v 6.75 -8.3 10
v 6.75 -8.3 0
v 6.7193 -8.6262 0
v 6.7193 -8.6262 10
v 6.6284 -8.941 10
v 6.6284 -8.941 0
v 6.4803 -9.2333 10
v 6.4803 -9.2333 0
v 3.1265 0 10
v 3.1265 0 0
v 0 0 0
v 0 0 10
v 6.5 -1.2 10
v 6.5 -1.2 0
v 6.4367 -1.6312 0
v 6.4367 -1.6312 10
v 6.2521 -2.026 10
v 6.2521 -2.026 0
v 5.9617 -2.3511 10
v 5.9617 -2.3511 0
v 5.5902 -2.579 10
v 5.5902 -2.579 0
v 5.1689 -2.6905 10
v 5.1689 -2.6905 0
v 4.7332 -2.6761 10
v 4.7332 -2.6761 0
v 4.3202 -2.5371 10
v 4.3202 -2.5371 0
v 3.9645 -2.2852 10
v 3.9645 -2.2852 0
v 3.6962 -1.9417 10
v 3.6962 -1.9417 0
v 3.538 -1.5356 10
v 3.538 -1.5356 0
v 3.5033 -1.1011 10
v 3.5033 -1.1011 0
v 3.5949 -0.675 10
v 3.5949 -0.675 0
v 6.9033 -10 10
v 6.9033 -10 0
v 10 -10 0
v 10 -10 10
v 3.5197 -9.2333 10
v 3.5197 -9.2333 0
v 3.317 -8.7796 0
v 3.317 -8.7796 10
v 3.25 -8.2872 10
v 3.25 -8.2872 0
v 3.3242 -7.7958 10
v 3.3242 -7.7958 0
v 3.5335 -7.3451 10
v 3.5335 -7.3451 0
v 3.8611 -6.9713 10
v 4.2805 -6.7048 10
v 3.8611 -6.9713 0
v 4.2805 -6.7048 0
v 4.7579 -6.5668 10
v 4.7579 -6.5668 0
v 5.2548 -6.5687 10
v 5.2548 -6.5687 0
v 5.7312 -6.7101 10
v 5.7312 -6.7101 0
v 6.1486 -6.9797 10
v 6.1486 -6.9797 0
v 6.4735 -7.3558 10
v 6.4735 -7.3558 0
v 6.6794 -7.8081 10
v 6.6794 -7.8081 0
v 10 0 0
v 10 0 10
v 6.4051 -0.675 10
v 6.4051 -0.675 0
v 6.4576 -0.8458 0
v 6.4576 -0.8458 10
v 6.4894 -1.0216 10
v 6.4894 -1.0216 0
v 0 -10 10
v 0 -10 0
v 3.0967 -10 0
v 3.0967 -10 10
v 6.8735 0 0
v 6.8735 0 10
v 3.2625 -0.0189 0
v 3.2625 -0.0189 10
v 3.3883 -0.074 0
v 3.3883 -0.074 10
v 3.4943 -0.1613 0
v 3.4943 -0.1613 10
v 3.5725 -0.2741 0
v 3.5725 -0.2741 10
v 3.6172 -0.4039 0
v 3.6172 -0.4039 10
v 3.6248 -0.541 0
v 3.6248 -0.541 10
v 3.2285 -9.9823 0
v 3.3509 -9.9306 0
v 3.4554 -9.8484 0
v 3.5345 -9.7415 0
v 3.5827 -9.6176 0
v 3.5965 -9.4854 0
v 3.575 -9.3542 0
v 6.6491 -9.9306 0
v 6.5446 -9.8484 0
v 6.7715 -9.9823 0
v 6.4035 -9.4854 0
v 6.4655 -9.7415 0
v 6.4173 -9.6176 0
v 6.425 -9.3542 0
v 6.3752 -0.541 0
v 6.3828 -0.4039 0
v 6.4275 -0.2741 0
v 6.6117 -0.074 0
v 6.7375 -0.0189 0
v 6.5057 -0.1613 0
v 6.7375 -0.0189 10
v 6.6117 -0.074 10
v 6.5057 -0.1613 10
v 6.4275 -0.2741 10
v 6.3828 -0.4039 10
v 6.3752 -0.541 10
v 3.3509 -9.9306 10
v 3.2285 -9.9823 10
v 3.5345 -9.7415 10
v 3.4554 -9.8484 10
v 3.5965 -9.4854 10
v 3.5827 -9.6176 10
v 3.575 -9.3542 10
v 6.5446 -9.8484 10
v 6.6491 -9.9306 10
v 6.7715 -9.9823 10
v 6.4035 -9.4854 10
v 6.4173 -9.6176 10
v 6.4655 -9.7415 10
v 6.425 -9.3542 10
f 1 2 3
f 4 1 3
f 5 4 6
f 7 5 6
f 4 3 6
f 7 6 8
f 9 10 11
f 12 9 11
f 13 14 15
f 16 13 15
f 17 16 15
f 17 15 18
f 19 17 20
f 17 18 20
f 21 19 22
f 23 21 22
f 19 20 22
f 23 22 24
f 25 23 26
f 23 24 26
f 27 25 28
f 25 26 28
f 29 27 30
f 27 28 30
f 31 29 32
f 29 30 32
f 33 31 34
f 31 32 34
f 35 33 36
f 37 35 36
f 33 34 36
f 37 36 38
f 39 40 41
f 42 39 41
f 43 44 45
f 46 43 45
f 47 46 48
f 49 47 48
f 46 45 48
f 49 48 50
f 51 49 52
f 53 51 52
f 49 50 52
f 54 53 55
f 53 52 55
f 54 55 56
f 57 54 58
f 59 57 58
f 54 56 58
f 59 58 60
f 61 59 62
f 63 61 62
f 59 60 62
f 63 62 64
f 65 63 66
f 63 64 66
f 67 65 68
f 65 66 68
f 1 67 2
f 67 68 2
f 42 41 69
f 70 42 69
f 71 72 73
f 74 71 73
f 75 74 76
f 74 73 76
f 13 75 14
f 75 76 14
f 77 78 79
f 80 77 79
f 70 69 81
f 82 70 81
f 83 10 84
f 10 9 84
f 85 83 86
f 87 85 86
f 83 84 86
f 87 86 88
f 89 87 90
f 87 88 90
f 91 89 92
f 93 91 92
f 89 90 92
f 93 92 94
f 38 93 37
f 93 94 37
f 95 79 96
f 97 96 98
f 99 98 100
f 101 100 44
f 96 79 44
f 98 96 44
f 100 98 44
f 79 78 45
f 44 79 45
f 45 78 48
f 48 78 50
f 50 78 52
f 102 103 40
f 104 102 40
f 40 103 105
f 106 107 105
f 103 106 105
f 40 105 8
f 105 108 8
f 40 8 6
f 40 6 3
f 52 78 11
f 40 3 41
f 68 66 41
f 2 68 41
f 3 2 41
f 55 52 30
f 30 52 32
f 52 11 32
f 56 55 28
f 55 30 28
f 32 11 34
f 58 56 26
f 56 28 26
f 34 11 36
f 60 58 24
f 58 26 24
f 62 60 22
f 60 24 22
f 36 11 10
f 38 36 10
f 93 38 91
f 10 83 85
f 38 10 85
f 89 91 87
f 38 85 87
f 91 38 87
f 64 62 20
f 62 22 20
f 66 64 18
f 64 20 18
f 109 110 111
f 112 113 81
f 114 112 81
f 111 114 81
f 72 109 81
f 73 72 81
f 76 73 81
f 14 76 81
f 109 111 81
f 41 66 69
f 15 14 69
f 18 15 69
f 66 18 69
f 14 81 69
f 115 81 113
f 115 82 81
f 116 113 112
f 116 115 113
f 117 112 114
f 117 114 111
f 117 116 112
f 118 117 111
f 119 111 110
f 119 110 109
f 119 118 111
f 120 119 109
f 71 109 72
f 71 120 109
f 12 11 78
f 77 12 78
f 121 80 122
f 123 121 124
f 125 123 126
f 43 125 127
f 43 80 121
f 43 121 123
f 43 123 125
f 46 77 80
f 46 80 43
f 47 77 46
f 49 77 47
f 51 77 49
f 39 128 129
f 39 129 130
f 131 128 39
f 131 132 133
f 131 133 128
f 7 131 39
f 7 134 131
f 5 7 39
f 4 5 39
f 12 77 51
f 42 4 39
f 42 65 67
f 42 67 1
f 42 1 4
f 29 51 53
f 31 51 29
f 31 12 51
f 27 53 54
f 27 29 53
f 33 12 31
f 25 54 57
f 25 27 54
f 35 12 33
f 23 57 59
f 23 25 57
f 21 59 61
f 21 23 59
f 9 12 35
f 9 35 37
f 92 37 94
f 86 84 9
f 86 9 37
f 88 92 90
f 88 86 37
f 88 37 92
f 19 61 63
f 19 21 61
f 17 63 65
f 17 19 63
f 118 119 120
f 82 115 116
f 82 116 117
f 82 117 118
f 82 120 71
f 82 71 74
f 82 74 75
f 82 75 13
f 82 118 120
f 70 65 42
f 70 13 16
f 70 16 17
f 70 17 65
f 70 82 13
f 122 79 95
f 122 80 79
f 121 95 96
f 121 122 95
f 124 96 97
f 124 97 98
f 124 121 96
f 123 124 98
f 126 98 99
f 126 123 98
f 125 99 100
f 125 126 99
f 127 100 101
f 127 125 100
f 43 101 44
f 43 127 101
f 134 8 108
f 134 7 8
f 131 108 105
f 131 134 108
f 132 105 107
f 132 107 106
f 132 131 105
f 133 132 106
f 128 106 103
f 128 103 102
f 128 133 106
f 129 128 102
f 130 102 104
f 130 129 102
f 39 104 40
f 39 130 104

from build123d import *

# Parameters (mm, degrees)
EXTRUDE_1_DEPTH = 10
FILLET_1_R      = 0.5


with BuildPart() as part:
    # 草图1 → 凸台-拉伸1 (new body)
    with BuildSketch(Plane.XY):
        with BuildLine():
            Line((4.1, 0), (0, 0))
            Line((0, 0), (0, -10))
            Line((0, -10), (4.584668807, -10))
            ThreePointArc((4.584668807, -10), (3.919335757, -6.923531768), (6.75, -8.3))
            ThreePointArc((6.75, -8.3), (6.376468232, -9.380664243), (5.415331193, -10))
            Line((5.415331193, -10), (10, -10))
            Line((10, -10), (10, 0))
            Line((10, 0), (5.9, 0))
            ThreePointArc((5.9, 0), (6.341640786, -0.529179607), (6.5, -1.2))
            ThreePointArc((6.5, -1.2), (4.329179607, -2.541640786), (4.1, 0))
        make_face()
    extrude(amount=EXTRUDE_1_DEPTH)

    # 圆角1
    fillet_1_edges = [part.edges().sort_by_distance(p)[0] for p in [
        (4.584668807, -10, 5),
        (4.1, 0, 5),
        (5.9, 0, 5),
        (5.415331193, -10, 5),
    ]]
    fillet(fillet_1_edges, radius=FILLET_1_R)


solid = part.part
